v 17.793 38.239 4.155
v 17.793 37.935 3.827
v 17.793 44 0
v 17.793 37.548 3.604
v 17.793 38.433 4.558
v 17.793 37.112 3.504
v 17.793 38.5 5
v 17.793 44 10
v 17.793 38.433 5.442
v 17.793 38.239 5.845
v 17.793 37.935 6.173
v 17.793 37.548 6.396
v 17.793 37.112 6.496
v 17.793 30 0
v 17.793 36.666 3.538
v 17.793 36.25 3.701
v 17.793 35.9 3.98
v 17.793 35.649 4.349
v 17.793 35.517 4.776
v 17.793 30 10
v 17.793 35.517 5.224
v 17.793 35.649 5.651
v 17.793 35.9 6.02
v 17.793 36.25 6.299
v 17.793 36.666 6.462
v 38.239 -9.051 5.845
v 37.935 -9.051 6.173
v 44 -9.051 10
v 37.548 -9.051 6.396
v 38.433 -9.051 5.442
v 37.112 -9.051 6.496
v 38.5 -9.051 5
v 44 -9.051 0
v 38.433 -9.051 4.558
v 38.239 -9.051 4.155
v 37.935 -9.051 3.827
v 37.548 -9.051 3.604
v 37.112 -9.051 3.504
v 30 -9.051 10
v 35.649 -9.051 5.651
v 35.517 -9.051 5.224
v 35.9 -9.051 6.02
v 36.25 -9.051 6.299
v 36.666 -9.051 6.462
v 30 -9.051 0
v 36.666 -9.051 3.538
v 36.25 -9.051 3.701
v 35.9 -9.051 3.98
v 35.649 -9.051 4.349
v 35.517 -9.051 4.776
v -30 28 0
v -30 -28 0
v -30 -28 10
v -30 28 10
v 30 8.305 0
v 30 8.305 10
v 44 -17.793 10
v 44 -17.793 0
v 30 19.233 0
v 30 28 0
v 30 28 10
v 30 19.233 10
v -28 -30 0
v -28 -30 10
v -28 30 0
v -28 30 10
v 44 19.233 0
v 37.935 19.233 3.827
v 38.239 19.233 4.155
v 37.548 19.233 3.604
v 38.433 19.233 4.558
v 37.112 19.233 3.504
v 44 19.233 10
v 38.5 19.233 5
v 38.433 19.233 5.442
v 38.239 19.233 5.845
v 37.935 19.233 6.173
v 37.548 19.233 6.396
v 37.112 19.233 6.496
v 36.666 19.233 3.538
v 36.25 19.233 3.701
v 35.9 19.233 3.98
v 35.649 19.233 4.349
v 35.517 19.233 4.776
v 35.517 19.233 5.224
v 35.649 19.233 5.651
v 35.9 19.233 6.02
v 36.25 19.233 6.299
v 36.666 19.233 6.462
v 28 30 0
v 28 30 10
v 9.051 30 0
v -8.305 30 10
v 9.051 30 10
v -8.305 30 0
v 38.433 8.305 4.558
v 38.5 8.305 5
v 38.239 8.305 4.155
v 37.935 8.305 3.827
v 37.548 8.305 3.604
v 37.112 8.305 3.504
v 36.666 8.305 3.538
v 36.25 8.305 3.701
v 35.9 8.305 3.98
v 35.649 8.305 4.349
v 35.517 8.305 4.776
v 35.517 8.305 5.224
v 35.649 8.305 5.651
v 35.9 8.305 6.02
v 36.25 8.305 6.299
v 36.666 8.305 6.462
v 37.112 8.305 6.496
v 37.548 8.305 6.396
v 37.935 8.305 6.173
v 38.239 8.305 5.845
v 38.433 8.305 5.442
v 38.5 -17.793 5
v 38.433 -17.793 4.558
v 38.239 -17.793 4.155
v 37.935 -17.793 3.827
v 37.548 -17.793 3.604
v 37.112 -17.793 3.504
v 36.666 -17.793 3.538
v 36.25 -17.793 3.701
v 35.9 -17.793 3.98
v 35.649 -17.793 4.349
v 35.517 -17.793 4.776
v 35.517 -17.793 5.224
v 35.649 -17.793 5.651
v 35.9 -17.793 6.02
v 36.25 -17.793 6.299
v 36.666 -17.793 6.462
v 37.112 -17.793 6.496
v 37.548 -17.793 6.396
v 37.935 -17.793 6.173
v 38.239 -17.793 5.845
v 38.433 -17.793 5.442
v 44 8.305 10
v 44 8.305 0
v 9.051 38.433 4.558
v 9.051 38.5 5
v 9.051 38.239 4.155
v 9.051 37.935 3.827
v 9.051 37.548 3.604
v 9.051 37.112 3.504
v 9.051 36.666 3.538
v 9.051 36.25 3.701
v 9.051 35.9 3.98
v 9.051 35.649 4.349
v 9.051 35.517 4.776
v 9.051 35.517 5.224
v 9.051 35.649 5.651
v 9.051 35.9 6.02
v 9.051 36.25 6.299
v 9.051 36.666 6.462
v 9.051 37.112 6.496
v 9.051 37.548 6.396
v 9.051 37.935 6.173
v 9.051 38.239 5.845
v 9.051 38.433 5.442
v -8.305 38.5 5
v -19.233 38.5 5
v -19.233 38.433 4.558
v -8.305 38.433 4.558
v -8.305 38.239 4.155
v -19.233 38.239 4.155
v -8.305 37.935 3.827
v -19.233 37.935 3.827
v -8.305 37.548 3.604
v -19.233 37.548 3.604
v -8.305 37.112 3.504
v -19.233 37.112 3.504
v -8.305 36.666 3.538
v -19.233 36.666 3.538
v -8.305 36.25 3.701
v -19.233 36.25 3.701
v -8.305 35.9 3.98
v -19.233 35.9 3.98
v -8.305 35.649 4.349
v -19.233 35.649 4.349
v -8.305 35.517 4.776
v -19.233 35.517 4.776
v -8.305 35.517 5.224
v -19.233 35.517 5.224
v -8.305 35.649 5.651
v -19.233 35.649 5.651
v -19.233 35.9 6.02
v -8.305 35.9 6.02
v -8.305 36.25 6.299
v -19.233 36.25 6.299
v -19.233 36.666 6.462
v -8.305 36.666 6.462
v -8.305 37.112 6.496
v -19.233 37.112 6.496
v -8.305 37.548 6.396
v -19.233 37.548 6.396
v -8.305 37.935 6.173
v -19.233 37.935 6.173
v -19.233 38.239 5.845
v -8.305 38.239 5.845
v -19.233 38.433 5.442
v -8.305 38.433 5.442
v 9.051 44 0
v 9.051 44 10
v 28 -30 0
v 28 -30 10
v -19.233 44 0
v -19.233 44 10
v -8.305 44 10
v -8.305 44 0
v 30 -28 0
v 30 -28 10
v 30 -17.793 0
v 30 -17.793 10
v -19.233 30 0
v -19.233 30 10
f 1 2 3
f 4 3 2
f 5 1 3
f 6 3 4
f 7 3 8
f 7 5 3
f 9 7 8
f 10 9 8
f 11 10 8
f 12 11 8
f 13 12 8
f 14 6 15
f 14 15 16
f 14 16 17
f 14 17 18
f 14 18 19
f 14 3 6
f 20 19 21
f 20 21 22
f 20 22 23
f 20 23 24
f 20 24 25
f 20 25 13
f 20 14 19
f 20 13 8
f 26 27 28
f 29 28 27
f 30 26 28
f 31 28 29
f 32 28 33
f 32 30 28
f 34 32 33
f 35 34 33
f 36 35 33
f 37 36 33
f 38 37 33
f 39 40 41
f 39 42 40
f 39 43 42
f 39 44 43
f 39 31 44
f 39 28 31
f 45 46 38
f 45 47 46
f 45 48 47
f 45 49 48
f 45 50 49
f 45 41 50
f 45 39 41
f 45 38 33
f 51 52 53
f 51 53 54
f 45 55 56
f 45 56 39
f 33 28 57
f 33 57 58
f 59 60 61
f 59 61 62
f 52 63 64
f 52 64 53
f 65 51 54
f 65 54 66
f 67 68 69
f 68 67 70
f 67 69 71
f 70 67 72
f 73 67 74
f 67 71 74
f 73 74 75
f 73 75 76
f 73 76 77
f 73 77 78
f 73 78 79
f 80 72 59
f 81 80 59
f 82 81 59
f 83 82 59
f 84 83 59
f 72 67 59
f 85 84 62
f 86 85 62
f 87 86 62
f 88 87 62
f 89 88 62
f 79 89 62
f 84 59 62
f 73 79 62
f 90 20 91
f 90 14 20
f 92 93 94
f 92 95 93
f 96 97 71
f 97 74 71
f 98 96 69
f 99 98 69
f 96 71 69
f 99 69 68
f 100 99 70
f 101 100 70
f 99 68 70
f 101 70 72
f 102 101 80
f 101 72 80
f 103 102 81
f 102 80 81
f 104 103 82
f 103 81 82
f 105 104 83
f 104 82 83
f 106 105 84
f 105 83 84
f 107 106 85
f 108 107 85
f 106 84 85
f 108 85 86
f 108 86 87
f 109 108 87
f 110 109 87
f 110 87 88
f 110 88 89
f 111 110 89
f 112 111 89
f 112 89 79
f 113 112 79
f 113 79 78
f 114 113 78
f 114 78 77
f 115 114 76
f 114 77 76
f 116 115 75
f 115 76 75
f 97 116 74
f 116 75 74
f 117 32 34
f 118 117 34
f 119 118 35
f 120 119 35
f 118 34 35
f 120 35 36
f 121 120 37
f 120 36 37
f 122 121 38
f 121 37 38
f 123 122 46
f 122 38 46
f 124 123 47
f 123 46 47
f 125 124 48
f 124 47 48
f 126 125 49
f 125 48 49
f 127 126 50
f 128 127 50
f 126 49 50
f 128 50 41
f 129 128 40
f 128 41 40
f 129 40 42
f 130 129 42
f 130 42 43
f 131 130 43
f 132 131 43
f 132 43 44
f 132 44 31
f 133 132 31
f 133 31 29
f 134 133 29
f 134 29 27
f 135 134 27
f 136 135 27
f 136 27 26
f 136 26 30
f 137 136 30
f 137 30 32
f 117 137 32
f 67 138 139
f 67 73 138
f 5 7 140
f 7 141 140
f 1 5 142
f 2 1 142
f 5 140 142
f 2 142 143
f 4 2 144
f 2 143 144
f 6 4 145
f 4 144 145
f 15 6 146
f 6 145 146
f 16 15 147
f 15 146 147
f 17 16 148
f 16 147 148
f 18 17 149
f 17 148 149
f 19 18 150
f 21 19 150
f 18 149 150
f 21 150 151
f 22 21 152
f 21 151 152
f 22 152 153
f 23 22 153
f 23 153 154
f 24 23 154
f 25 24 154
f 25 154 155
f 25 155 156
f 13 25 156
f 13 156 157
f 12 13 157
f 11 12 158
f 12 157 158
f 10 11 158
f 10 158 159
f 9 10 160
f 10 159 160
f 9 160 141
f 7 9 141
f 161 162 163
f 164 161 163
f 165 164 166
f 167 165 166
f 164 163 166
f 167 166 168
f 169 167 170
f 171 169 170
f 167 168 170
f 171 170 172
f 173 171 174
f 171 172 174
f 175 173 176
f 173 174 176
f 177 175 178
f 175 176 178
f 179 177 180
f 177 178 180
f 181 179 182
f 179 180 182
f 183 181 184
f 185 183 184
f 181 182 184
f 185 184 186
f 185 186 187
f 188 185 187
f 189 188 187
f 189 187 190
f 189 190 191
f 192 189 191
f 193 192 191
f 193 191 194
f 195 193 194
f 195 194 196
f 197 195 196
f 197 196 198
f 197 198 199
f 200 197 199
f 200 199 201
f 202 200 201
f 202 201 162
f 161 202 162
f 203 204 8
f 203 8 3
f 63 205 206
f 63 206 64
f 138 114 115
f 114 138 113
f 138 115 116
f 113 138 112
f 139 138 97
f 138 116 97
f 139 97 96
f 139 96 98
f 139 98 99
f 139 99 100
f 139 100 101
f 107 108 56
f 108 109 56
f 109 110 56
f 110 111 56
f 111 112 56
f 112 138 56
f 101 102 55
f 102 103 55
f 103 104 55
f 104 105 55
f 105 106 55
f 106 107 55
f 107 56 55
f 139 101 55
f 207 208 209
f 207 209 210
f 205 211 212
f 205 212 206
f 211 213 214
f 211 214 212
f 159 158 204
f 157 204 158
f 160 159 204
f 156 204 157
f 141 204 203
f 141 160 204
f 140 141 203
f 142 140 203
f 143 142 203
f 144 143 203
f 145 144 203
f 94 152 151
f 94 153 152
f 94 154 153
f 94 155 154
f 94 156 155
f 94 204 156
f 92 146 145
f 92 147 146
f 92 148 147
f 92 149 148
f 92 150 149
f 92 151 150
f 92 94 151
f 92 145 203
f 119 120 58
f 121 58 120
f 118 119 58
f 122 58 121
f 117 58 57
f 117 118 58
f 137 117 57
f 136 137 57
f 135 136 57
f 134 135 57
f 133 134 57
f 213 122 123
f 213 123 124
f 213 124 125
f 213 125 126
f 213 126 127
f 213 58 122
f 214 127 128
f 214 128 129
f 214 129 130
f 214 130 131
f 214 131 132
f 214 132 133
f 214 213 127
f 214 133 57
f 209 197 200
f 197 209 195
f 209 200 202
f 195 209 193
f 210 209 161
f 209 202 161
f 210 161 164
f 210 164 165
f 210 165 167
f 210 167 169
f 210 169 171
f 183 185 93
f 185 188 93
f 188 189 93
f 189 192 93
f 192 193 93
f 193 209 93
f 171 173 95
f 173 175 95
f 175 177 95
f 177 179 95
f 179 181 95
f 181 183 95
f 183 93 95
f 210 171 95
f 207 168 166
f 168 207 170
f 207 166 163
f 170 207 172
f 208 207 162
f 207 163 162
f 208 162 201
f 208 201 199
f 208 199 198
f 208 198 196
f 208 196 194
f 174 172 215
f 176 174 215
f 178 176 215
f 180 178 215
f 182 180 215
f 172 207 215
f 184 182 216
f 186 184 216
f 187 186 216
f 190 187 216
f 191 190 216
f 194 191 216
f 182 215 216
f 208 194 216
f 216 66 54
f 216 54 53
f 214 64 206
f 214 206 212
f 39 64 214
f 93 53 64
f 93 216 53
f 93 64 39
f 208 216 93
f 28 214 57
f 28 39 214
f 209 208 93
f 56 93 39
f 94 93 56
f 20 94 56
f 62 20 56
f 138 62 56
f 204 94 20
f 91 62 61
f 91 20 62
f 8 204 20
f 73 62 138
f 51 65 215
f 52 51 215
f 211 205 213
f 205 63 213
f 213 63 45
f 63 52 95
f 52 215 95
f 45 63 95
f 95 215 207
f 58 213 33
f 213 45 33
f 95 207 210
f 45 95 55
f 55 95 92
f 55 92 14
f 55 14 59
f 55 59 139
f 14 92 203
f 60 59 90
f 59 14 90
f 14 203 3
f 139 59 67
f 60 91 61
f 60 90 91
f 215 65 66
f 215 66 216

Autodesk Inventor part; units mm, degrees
ref_plane "YZ Plane" through (0, 0, 0) normal (1, 0, 0) x (0, 1, 0)
ref_plane "XZ Plane" through (0, 0, 0) normal (0, 1, 0) x (-1, 0, 0)
ref_plane "XY Plane" through (0, 0, 0) normal (0, 0, 1) x (1, 0, 0)
ref_plane "Work Plane1" through (0, 0, 0) normal (0, 0, 1) x (1, 0, 0)
sketch "Sketch1" plane through (0, 0, 0) normal (0, 0, 1) x (1, 0, 0)
  circle A0 centre (17.5, 17.5) radius 1.95 projected
  circle A1 centre (17.5, -17.5) radius 1.95 projected
  circle A2 centre (-17.5, -17.5) radius 1.95 projected
  circle A3 centre (-17.5, 17.5) radius 1.95 projected
  circle A4 centre (0, 0) radius 7.5 projected
  line L0 (-30, 28) -> (-28, 30) projected
  line L1 (-30, -28) -> (-30, 28) projected
  line L2 (-28, -30) -> (-30, -28) projected
  line L3 (28, -30) -> (-28, -30) projected
  line L4 (30, -28) -> (28, -30) projected
  line L5 (30, 28) -> (30, -28) projected
  line L6 (28, 30) -> (30, 28) projected
  line L7 (-28, 30) -> (28, 30) projected
extrude "Extrusion1" add sketch "Sketch1" along normal blind 10 contours A0 | A1 | A2 | A3 | A4 | L0 L7 L6 L5 L4 L3 L2 L1
sketch "Sketch2" plane through (0, 0, 10) normal (0, 0, 1) x (1, 0, 0)
  point P0 (0, 0)
sketch "Sketch3" plane through (30, -28, 0) normal (1, 0, 0) x (0, 0, -1)
  line L0 (0, 56) -> (0, 0) projected
  line L1 (0, 56) -> (-10, 56) projected
  line L2 (-10, 0) -> (-10, 56) projected
  line L3 (0, 0) -> (-10, 0) projected
  line L4 (-10, 0) -> (-10, 56) projected
  line L5 (0, 47.2331) -> (-10, 47.2331)
  line L6 (-10, 47.2331) -> (-10, 36.3051)
  line L7 (-10, 36.3051) -> (0, 36.3051)
  line L8 (0, 36.3051) -> (0, 47.2331)
  line L9 (0, 56) -> (0, 0) projected
  line L10 (0, 10.2066) -> (-10, 10.2066)
  line L11 (-10, 10.2066) -> (-10, 18.9489)
  line L12 (-10, 18.9489) -> (0, 18.9489)
  line L13 (0, 18.9489) -> (0, 10.2066)
  point P0 (0, 28)
extrude "Extrusion2" add sketch "Sketch3" along normal blind 14 contours L0 L7 L2 L5 | L0 L10 L2 L12
sketch "Sketch4" plane through (30, 19.2331, 10) normal (0, 1, 0) x (1, 0, 0)
  line L0 (0, 0) -> (0, 10) projected
  line L1 (0, 0) -> (14, 0) projected
  line L2 (14, 10) -> (14, 0) projected
  line L3 (0, 10) -> (14, 10) projected
  circle A0 centre (7, 5) radius 1.5
  point P0 (-30, 10)
  dimension "d4" = 3
extrude "Extrusion3" cut sketch "Sketch4" against normal through all contours A0
pattern_circular "Circular Pattern1" count 2 over 90 about axis through (0, 0, 0) along (0, 0, 1) of "Extrusion2", "Extrusion3"
properties part number "00_XY_stage-CHUO_SEIKI_LD-647-R1-Middle"
